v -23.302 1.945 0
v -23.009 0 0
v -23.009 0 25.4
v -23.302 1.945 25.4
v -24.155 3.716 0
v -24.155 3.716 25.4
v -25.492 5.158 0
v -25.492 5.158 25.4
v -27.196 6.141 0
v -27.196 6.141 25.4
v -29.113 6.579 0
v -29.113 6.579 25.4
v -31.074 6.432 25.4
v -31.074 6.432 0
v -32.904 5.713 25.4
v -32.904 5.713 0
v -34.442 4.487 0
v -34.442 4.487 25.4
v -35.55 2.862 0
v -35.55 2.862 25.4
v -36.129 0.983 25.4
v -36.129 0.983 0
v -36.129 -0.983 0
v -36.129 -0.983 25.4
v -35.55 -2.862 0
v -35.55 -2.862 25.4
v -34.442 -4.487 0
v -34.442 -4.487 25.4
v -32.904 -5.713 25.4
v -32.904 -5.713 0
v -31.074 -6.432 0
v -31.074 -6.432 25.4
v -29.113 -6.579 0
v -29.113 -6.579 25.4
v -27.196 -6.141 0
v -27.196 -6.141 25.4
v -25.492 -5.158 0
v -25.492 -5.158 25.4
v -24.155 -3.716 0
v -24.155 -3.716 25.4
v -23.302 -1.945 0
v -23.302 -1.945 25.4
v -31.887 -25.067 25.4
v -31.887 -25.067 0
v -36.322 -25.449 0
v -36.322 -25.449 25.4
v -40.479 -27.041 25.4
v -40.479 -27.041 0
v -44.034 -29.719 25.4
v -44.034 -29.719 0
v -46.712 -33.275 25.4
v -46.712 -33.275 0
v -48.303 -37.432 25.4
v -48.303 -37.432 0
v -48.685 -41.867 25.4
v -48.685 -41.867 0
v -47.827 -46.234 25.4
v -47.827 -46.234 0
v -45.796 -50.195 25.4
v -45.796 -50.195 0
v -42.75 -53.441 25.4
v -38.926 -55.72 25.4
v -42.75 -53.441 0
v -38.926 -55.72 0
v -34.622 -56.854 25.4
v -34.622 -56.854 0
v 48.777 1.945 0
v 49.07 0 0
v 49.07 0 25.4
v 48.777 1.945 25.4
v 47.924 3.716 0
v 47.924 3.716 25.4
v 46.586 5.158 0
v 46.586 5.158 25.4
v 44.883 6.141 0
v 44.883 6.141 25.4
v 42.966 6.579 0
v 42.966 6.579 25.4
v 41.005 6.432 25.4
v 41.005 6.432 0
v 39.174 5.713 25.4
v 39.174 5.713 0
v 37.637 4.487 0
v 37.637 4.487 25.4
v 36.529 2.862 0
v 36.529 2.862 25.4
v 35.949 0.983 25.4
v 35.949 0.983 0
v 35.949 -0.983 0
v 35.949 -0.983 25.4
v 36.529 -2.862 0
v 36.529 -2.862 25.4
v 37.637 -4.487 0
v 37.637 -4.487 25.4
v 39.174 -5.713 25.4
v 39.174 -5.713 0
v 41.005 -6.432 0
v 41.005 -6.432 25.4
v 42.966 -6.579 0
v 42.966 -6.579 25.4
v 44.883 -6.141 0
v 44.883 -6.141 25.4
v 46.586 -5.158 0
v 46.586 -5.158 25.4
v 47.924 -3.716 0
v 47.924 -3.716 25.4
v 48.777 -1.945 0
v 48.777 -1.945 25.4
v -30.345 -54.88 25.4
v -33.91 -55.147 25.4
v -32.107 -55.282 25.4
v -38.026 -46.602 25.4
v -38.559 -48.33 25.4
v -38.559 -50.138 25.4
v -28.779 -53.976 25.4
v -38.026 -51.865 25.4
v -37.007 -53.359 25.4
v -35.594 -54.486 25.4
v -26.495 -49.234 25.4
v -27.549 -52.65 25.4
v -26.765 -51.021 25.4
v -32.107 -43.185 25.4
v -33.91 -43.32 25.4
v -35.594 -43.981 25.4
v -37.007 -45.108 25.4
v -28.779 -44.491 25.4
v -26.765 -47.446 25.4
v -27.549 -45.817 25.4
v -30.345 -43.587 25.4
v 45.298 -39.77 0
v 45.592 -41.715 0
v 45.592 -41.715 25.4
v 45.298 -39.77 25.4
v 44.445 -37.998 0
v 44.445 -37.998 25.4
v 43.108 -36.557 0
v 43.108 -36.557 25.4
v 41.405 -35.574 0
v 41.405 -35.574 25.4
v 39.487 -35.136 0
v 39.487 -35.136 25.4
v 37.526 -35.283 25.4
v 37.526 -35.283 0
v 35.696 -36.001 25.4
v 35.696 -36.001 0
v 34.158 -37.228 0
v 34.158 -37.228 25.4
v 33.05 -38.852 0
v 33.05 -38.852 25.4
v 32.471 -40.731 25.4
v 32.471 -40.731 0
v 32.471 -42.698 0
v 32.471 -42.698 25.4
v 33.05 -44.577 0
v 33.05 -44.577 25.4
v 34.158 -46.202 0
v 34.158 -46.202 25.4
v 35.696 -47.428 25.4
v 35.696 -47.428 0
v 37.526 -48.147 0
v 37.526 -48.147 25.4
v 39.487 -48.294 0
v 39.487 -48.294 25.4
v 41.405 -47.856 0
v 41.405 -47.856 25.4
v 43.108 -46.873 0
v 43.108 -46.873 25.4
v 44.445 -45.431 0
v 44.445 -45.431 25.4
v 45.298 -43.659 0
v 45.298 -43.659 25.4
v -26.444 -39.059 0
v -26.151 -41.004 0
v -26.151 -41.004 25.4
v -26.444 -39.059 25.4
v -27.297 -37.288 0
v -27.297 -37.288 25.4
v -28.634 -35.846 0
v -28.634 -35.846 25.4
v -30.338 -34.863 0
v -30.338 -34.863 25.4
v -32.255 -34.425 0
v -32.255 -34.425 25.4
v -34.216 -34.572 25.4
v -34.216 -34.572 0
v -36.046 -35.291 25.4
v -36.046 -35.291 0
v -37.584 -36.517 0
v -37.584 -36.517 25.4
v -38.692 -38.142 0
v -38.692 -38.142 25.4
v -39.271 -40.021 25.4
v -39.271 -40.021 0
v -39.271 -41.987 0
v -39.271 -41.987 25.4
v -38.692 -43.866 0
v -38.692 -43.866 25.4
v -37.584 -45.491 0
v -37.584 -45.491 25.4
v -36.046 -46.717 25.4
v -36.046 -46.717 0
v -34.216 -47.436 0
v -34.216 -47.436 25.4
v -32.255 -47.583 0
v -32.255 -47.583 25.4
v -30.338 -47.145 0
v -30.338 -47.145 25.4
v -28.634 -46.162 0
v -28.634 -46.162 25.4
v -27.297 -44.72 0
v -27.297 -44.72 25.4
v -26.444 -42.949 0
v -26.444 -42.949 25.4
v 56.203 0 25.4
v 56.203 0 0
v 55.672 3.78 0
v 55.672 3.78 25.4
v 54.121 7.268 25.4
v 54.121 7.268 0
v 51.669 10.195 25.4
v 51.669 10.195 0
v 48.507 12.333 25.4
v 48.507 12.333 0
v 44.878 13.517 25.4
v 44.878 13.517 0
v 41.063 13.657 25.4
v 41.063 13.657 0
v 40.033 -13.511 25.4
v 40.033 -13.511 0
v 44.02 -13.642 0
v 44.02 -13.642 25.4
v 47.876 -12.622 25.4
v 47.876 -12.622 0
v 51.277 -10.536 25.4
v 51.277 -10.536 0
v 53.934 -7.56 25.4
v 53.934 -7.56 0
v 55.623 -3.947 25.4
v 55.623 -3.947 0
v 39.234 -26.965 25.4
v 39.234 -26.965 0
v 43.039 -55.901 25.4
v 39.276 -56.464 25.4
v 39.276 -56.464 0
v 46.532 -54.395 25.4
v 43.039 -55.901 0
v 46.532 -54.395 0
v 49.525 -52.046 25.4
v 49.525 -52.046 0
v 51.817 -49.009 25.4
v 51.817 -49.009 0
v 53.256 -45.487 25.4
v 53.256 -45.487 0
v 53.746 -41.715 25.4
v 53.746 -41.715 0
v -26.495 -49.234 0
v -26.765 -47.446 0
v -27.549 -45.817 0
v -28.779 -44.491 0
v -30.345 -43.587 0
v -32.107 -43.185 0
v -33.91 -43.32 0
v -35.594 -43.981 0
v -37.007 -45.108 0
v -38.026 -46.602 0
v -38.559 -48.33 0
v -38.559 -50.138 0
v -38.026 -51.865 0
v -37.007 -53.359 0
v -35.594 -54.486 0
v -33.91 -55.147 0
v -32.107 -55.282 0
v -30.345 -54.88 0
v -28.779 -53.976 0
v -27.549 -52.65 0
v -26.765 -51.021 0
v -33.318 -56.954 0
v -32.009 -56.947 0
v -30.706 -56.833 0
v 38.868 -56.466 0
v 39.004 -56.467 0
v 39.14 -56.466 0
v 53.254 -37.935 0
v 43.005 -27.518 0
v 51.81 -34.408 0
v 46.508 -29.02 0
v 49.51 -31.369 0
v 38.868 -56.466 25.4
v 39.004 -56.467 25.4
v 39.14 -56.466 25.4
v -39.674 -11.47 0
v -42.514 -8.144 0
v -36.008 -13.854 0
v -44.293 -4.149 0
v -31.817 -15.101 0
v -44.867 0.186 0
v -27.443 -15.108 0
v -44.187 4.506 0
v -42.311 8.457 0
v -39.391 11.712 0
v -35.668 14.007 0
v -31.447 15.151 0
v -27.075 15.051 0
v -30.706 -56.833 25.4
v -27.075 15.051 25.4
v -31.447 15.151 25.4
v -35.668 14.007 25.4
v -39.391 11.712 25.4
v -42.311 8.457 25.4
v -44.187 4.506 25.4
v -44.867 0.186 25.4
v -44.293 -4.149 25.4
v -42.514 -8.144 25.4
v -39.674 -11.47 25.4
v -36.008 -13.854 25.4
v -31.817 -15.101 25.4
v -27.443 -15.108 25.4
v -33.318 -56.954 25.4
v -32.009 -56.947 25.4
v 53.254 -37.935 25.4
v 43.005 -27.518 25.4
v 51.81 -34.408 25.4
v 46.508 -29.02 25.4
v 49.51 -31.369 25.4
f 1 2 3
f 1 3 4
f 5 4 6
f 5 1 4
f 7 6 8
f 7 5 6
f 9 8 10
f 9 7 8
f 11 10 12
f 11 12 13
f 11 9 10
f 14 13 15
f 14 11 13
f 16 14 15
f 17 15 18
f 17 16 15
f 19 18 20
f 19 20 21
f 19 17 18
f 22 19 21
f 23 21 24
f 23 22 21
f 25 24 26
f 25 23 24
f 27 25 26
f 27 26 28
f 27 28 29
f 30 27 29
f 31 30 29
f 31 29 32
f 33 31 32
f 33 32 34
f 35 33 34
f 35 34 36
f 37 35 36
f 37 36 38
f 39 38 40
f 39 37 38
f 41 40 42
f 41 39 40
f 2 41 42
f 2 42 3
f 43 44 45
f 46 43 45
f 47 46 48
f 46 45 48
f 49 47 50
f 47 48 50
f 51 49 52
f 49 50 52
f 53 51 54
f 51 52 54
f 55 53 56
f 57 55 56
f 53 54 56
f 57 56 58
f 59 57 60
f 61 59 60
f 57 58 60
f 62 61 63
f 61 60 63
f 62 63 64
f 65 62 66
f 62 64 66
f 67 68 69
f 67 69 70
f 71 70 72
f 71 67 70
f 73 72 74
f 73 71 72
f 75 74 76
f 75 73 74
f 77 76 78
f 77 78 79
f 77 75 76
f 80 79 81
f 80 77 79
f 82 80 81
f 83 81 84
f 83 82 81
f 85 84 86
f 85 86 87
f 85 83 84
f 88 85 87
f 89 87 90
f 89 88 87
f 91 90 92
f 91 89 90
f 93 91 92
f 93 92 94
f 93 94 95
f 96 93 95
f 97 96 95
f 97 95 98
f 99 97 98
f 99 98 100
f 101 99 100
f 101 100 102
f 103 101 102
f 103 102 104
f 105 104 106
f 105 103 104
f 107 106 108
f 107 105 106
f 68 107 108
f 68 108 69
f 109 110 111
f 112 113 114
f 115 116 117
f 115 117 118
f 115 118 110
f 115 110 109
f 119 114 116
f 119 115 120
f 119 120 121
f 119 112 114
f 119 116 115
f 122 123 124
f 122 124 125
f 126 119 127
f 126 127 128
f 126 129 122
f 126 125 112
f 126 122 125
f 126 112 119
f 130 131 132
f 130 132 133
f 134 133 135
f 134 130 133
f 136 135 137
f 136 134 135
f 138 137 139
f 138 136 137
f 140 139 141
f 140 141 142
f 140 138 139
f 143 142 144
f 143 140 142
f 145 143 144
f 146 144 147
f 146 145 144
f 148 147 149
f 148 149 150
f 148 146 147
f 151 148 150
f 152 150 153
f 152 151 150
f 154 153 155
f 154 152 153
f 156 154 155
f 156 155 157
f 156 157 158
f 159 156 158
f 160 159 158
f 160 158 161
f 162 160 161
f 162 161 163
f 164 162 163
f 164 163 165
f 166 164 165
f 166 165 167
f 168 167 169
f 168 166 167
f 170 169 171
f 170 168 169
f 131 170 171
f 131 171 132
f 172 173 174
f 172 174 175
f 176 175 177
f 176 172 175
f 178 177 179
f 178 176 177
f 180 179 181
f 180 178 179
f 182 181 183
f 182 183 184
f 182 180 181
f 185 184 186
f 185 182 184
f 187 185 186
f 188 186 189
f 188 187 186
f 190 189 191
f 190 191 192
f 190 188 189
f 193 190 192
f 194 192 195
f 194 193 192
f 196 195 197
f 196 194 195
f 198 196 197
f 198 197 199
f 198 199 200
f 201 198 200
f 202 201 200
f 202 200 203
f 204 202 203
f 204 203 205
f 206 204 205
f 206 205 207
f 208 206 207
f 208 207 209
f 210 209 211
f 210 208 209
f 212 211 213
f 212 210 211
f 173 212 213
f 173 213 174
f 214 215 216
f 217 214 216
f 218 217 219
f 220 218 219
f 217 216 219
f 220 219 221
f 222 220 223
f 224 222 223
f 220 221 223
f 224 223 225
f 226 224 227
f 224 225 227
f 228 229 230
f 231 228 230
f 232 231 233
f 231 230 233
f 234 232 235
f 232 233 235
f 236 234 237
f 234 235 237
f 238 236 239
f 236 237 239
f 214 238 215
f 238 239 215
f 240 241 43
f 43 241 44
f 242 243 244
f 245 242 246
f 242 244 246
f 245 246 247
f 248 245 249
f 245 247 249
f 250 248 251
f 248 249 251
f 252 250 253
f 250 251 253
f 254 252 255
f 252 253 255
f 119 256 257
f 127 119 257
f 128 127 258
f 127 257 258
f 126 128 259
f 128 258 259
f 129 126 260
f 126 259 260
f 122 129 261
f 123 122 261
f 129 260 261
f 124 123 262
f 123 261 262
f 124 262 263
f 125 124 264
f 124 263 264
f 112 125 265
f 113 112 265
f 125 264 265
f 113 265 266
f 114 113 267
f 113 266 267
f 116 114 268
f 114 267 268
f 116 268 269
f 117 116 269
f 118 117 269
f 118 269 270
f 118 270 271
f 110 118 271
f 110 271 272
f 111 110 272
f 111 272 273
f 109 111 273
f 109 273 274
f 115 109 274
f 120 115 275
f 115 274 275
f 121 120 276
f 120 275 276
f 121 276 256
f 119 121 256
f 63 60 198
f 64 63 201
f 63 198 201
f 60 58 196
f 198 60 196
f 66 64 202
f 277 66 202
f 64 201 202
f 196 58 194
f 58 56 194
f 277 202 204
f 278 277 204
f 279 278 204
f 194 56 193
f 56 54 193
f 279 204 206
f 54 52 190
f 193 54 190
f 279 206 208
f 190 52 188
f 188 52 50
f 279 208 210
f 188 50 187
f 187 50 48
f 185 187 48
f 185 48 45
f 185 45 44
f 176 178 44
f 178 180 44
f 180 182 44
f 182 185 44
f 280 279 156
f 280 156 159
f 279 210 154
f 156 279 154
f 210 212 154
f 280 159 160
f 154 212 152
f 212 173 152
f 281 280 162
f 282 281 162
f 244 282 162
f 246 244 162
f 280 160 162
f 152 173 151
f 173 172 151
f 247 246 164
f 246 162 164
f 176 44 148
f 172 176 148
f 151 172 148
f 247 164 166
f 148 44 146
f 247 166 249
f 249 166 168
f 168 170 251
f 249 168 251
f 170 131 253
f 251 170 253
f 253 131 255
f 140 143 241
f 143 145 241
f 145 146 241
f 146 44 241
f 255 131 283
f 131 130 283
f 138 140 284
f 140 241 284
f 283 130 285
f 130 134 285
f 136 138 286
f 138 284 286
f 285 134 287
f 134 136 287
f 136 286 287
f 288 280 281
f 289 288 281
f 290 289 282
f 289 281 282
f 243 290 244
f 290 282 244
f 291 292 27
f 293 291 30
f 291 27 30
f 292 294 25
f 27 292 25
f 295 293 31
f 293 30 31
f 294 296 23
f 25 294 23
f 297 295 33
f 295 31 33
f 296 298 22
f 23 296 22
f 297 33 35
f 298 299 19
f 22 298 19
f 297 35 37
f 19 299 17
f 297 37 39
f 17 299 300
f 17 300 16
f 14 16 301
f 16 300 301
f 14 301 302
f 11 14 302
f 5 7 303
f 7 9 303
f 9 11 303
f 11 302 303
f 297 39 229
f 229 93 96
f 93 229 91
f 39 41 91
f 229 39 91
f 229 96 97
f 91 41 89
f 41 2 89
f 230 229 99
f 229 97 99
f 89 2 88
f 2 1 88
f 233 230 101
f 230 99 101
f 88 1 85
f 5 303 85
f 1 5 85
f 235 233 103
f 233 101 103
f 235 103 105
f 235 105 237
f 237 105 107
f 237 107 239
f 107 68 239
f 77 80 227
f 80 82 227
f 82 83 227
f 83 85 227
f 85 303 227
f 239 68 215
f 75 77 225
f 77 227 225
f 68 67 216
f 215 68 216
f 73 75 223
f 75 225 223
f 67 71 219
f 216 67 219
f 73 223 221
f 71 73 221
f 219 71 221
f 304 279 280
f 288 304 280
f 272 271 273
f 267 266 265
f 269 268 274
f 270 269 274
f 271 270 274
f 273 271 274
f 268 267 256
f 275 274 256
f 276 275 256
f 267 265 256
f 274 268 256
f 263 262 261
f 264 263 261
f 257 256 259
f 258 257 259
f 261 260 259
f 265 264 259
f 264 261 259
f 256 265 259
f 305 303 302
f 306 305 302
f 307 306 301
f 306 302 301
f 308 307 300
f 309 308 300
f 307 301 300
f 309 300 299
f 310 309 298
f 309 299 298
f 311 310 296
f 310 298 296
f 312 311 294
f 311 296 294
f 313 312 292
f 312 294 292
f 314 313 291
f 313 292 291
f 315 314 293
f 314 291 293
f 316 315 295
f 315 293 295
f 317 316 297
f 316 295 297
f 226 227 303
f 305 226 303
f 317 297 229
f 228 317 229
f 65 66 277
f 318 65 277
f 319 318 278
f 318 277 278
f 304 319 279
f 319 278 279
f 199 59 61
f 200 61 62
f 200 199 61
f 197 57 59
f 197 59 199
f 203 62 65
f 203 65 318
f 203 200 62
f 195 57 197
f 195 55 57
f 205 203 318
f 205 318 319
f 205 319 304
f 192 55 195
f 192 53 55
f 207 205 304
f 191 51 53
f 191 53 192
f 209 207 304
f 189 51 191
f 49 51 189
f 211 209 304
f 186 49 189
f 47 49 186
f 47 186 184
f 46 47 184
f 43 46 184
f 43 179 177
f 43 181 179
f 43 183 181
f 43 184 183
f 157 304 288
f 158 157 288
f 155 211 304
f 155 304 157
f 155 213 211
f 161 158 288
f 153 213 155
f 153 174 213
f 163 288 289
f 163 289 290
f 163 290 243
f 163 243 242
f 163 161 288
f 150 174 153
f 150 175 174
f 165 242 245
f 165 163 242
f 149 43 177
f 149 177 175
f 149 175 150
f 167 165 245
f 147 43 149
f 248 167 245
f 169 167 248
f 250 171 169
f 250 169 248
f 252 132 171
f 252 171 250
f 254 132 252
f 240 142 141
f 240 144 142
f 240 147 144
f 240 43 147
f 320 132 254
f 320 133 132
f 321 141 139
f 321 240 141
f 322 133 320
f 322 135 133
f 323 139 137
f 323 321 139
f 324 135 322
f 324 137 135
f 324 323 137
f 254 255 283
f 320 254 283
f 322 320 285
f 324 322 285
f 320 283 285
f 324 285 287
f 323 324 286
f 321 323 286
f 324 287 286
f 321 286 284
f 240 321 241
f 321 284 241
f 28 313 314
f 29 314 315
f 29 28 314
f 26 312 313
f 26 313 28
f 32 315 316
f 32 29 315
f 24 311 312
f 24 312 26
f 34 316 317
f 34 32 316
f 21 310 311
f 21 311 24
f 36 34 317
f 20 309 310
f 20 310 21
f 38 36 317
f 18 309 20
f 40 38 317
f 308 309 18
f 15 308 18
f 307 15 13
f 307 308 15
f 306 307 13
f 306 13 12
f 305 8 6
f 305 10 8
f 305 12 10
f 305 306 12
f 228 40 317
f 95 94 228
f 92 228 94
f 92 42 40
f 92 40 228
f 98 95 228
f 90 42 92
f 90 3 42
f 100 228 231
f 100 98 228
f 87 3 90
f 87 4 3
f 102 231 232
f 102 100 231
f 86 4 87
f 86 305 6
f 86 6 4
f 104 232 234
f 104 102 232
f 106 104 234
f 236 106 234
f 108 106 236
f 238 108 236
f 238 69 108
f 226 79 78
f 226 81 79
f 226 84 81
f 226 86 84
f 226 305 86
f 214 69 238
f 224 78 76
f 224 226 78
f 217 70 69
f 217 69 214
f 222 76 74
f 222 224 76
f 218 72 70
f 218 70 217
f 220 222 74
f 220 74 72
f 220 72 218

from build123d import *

# Parameters (mm, degrees)
F0_R     = 6.597207
F1_DEPTH = 25.4
F2_R     = 6.065565
F3_DEPTH = 25.4
F4_R     = 6.597207
F5_DEPTH = 25.4


with BuildPart() as f1:
    # F0 (on Top) → F1 (new body)
    with BuildSketch(Plane.XY):
        with BuildLine():
            ThreePointArc((-27.443484, -15.108255), (-18.074588, -9.998342), (-14.343559, 0))
            ThreePointArc((-14.343559, 0), (-17.953345, 9.856775), (-27.075145, 15.05094))
            ThreePointArc((-27.075145, 15.05094), (-44.866825, 0.186386), (-27.443484, -15.108255))
        make_face()
        with Locations((-29.605761, 0)):
            Circle(F0_R, mode=Mode.SUBTRACT)
        with BuildLine():
            ThreePointArc((-27.075145, 15.05094), (-17.953345, 9.856775), (-14.343559, 0))
            ThreePointArc((-14.343559, 0), (-18.074588, -9.998342), (-27.443484, -15.108255))
            Line((-27.443484, -15.108255), (40.033196, -13.511142))
            ThreePointArc((40.033196, -13.511142), (28.753176, 0.520221), (41.063349, 13.657102))
            Line((41.063349, 13.657102), (-27.075145, 15.05094))
        make_face()
        with BuildLine():
            ThreePointArc((56.20263, 0), (51.669435, 10.194536), (41.063349, 13.657102))
            ThreePointArc((41.063349, 13.657102), (28.753176, 0.520221), (40.033196, -13.511142))
            ThreePointArc((40.033196, -13.511142), (51.276557, -10.535672), (56.20263, 0))
        make_face()
        with Locations((42.472973, 0)):
            Circle(F0_R, mode=Mode.SUBTRACT)
    extrude(amount=F1_DEPTH)


with BuildPart() as f3:
    # F2 (on Top) → F3 (new body)
    with BuildSketch(Plane.XY):
        with Locations((-32.560728, -49.233526)):
            Circle(F2_R)
    extrude(amount=F3_DEPTH)


with BuildPart() as f5:
    # F4 (on Top) → F5 (new body)
    with BuildSketch(Plane.XY):
        with BuildLine():
            ThreePointArc((-30.706154, -56.833053), (-20.762121, -51.543046), (-16.787599, -41.004017))
            ThreePointArc((-16.787599, -41.004017), (-21.161974, -30.026939), (-31.887233, -25.067078))
            ThreePointArc((-31.887233, -25.067078), (-48.649153, -39.635809), (-34.622259, -56.853709))
            Line((-34.622259, -56.853709), (-30.706154, -56.833053))
        make_face()
        with Locations((-32.747753, -41.004017)):
            Circle(F4_R, mode=Mode.SUBTRACT)
        with BuildLine():
            ThreePointArc((-31.887233, -25.067078), (-21.161974, -30.026939), (-16.787599, -41.004017))
            ThreePointArc((-16.787599, -41.004017), (-20.762121, -51.543046), (-30.706154, -56.833053))
            Line((-30.706154, -56.833053), (38.868471, -56.466072))
            ThreePointArc((38.868471, -56.466072), (24.243621, -41.532109), (39.233736, -26.964818))
            Line((39.233736, -26.964818), (-31.887233, -25.067078))
        make_face()
        with BuildLine():
            ThreePointArc((-34.622259, -56.853709), (-32.66357, -56.963949), (-30.706154, -56.833053))
            Line((-30.706154, -56.833053), (-34.622259, -56.853709))
        make_face()
        with BuildLine():
            ThreePointArc((53.746224, -41.714743), (49.509795, -31.368577), (39.233736, -26.964818))
            ThreePointArc((39.233736, -26.964818), (24.243621, -41.532109), (38.868471, -56.466072))
            Line((38.868471, -56.466072), (39.275847, -56.463924))
            ThreePointArc((39.275847, -56.463924), (49.524554, -52.045887), (53.746224, -41.714743))
        make_face()
        with Locations((38.994357, -41.714743)):
            Circle(F4_R, mode=Mode.SUBTRACT)
        with BuildLine():
            Line((39.275847, -56.463924), (38.868471, -56.466072))
            ThreePointArc((38.868471, -56.466072), (39.072167, -56.466404), (39.275847, -56.463924))
        make_face()
    extrude(amount=F5_DEPTH)


solid = Compound([f1.part, f3.part, f5.part])
